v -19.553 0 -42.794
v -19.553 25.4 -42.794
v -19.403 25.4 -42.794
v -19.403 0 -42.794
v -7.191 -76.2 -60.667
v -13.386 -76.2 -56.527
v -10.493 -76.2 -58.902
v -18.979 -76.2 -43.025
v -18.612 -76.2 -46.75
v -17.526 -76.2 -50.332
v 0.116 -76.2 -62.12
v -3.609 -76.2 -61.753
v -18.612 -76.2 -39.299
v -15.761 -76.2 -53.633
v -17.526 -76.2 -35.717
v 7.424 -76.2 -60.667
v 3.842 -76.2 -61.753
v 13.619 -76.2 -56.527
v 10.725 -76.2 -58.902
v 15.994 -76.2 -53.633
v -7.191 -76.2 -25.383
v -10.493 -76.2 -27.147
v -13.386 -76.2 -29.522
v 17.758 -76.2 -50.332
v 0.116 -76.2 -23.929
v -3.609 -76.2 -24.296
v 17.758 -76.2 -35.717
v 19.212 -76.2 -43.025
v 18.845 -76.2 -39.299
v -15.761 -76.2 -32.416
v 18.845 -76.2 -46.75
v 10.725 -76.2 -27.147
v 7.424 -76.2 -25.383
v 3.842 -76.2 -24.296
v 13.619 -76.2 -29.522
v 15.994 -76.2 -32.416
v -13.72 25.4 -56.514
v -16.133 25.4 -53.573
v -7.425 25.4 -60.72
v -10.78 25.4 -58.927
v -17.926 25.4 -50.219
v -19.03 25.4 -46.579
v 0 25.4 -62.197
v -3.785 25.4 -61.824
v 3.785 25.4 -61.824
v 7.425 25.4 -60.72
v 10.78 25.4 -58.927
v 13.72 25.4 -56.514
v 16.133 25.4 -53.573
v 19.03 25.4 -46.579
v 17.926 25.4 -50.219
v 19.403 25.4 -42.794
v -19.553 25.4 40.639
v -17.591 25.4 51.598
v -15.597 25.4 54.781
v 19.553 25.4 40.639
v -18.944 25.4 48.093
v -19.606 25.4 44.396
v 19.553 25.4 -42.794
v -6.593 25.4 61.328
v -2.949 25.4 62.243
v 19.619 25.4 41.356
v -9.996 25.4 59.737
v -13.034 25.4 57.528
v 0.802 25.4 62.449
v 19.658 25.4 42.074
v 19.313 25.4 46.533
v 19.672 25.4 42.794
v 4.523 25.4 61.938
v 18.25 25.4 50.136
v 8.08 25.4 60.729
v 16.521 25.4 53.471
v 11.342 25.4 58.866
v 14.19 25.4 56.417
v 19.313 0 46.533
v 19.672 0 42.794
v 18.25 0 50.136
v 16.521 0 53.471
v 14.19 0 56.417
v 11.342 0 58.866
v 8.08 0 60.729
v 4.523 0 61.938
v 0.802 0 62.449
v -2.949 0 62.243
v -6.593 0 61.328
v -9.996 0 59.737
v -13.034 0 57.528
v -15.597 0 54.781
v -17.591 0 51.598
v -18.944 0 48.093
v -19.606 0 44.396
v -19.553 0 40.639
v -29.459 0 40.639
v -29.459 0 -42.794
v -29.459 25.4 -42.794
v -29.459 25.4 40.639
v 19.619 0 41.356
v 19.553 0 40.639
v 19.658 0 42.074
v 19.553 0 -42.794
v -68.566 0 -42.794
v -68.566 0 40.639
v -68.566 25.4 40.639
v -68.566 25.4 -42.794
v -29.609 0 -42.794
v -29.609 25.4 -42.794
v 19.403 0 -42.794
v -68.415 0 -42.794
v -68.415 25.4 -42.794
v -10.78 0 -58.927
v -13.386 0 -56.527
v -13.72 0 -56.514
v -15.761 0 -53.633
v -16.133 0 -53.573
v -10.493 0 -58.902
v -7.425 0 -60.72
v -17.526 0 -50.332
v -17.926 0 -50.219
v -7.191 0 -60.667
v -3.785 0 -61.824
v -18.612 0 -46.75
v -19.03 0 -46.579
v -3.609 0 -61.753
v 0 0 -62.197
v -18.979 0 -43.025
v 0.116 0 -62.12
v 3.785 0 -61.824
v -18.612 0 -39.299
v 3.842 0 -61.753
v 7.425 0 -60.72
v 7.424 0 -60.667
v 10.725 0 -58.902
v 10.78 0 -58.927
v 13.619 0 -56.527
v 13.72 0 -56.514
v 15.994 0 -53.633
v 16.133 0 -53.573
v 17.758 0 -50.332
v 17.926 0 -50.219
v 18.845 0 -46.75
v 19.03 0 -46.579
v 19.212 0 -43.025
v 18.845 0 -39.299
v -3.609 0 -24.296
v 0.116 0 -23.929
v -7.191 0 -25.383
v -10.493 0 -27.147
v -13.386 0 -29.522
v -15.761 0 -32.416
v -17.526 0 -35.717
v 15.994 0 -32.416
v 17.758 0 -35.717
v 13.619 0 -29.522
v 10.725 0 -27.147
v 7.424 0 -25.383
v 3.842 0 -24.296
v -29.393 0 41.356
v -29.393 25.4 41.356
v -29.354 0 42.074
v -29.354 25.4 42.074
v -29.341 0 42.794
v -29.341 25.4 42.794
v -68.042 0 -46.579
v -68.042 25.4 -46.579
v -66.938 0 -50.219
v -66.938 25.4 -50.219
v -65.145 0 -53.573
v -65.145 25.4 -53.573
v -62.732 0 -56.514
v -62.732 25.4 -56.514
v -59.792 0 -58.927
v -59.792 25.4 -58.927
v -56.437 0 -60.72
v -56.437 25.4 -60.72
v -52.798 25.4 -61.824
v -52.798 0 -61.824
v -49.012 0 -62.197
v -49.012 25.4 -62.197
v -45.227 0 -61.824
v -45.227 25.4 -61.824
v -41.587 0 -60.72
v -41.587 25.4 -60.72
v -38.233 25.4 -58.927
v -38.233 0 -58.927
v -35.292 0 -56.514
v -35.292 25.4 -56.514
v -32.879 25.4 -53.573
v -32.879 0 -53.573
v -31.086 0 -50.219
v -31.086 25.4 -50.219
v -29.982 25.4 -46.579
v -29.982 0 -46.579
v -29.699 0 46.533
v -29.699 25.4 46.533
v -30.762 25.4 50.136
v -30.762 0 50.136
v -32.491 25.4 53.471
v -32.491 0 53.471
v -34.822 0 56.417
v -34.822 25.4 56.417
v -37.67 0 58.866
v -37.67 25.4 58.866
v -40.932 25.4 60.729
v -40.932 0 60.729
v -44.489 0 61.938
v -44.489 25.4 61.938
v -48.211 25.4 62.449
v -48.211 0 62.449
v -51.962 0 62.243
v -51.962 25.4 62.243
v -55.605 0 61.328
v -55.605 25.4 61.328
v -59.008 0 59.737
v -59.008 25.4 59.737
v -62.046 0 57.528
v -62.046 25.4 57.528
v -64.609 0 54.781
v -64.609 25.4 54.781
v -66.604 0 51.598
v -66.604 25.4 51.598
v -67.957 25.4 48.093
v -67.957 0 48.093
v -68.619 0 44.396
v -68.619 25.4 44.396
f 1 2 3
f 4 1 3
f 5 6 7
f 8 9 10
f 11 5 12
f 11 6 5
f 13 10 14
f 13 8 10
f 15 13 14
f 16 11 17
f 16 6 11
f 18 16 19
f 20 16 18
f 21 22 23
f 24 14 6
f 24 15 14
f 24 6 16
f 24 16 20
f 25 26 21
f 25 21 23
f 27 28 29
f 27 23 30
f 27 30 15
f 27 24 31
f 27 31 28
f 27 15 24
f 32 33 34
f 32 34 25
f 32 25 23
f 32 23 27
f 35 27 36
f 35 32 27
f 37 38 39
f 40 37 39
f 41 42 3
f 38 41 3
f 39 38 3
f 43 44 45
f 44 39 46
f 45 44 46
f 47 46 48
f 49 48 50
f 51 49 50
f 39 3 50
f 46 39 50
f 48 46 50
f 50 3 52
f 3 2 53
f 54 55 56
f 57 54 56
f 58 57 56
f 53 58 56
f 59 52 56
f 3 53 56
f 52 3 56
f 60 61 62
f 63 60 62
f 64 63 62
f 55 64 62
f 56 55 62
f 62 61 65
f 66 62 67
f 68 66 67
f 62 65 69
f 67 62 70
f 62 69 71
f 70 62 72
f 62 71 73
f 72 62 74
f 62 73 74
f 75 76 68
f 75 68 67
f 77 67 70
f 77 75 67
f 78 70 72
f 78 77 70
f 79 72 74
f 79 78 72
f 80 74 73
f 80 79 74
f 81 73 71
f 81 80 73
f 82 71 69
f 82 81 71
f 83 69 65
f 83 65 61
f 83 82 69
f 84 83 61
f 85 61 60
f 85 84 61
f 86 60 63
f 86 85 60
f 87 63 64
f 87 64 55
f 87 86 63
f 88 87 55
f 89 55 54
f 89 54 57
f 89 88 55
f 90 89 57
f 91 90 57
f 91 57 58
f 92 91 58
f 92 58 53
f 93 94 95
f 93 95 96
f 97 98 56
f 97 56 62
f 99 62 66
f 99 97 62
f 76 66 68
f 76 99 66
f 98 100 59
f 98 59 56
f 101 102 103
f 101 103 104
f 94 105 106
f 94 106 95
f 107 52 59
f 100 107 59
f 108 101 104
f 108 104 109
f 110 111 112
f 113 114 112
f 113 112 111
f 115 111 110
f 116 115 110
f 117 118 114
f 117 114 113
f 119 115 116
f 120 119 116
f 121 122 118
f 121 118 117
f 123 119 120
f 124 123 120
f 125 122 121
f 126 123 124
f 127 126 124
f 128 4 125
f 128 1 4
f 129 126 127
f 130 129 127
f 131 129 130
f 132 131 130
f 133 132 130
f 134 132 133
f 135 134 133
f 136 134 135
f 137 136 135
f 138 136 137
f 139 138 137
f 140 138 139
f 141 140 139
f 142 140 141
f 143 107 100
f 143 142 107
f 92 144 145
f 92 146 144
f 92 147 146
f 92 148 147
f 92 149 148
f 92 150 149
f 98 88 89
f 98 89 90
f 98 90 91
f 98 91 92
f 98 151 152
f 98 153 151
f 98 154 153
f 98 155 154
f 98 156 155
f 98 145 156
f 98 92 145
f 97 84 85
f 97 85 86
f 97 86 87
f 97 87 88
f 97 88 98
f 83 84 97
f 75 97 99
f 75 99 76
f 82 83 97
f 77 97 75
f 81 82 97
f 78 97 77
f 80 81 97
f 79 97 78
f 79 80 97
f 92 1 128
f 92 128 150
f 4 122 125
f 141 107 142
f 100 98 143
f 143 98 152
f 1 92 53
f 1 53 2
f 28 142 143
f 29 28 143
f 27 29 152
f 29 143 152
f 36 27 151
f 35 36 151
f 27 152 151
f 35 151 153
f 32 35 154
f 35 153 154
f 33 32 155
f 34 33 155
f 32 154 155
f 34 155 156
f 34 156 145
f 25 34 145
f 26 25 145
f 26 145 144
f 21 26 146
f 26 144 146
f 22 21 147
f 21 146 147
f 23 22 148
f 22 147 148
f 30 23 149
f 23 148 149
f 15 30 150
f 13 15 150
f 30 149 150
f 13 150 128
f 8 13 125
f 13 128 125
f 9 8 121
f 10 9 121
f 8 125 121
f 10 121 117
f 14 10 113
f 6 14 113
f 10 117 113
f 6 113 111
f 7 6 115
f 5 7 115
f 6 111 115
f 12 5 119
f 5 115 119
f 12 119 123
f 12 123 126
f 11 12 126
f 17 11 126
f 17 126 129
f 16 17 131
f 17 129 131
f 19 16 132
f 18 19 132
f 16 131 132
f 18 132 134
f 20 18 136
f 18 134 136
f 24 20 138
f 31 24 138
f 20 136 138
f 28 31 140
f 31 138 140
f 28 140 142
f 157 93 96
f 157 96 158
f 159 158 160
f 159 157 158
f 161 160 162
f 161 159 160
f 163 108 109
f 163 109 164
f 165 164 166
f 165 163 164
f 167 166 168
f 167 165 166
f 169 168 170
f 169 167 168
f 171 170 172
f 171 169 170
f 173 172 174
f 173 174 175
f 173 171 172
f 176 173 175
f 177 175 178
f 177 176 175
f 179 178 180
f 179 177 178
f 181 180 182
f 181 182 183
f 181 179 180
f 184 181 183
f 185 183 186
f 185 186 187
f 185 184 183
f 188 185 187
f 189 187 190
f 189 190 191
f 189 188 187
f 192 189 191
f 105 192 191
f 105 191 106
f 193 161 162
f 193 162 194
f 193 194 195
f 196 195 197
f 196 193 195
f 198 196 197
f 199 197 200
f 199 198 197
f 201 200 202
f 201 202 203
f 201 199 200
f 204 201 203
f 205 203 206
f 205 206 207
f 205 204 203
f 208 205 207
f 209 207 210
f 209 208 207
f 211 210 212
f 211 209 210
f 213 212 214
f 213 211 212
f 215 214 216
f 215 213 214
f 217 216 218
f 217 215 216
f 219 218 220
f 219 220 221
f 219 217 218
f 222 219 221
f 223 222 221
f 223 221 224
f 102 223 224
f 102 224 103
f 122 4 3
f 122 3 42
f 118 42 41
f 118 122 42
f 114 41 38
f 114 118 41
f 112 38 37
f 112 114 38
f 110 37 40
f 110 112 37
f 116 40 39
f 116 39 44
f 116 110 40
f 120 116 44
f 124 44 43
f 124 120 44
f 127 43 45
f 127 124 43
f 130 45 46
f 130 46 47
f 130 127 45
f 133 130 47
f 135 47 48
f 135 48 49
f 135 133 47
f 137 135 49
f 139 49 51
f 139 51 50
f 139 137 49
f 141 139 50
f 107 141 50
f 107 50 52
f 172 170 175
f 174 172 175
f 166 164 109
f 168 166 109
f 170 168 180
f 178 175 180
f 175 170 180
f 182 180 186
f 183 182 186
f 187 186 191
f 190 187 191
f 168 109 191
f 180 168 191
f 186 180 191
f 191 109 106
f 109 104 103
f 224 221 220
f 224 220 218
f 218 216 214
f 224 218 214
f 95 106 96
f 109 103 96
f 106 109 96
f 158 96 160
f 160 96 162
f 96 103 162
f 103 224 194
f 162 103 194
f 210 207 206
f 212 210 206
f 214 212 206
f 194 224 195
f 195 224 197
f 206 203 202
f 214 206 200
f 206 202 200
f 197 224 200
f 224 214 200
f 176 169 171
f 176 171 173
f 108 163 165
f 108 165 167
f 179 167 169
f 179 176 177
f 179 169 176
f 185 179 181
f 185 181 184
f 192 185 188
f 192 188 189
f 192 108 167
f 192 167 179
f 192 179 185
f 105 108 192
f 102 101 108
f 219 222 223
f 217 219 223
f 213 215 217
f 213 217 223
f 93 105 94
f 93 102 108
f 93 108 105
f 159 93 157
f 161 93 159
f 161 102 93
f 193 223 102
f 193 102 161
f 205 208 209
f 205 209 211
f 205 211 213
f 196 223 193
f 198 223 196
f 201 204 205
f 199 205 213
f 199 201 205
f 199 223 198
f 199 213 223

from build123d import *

# Parameters (mm, degrees)
F1_DEPTH = 25.4
F2_R     = 19.0955706626
F3_DEPTH = 76.2
F5_DEPTH = 25.4


with BuildPart() as f1:
    # F0 (on Front) → F1 (new body)
    with BuildSketch(Plane.XZ):
        with BuildLine():
            Line((-19.5532236248, 40.6393535502), (-19.5532236248, 42.7938178182))
            Line((-19.5532236248, 42.7938178182), (19.5532236248, 42.7938178182))
            Line((19.5532236248, 42.7938178182), (19.5532236248, 40.6393535502))
            ThreePointArc((19.5532236248, 40.6393535502), (19.6419535806, 41.7149619699), (19.6715599383, 42.7938178182))
            ThreePointArc((19.6715599383, 42.7938178182), (-1.0788558483, 62.4357713988), (-19.5532236248, 40.6393535502))
        make_face()
        with BuildLine():
            Line((19.5532236248, 42.7938178182), (-19.5532236248, 42.7938178182))
            Line((-19.5532236248, 42.7938178182), (-19.5532236248, 40.6393535502))
            ThreePointArc((-19.5532236248, 40.6393535502), (0, 23.1222578799), (19.5532236248, 40.6393535502))
            Line((19.5532236248, 40.6393535502), (19.5532236248, 42.7938178182))
        make_face()
        with BuildLine():
            ThreePointArc((19.5532236248, 40.6393535502), (0, 23.1222578799), (-19.5532236248, 40.6393535502))
            Line((-19.5532236248, 40.6393535502), (-19.5532236248, -42.7938178182))
            Line((-19.5532236248, -42.7938178182), (-19.4028248978, -42.7938178182))
            ThreePointArc((-19.4028248978, -42.7938178182), (0, -23.3909929204), (19.4028248978, -42.7938178182))
            Line((19.4028248978, -42.7938178182), (19.5532236248, -42.7938178182))
            Line((19.5532236248, -42.7938178182), (19.5532236248, 40.6393535502))
        make_face()
        with BuildLine():
            ThreePointArc((19.4028248978, -42.7938178182), (0, -23.3909929204), (-19.4028248978, -42.7938178182))
            Line((-19.4028248978, -42.7938178182), (19.4028248978, -42.7938178182))
        make_face()
        with BuildLine():
            Line((19.4028248978, -42.7938178182), (-19.4028248978, -42.7938178182))
            ThreePointArc((-19.4028248978, -42.7938178182), (0, -62.196642716), (19.4028248978, -42.7938178182))
        make_face()
    extrude(amount=-F1_DEPTH)

    # F2 (on Front) → F3 (join)
    with BuildSketch(Plane.XZ):
        with Locations((0.1162295012, -43.0245069627)):
            Circle(F2_R)
    extrude(amount=F3_DEPTH)


with BuildPart() as f5:
    # F4 (on Front) → F5 (new body)
    with BuildSketch(Plane.XZ):
        with BuildLine():
            Line((-68.5655418783, 40.6393535502), (-68.5655418783, 42.7938178182))
            Line((-68.5655418783, 42.7938178182), (-29.4590946287, 42.7938178182))
            Line((-29.4590946287, 42.7938178182), (-29.4590946287, 40.6393535502))
            ThreePointArc((-29.4590946287, 40.6393535502), (-29.3703646729, 41.7149619699), (-29.3407583153, 42.7938178182))
            ThreePointArc((-29.3407583153, 42.7938178182), (-50.0911741018, 62.4357713988), (-68.5655418783, 40.6393535502))
        make_face()
        with BuildLine():
            Line((-29.4590946287, 42.7938178182), (-68.5655418783, 42.7938178182))
            Line((-68.5655418783, 42.7938178182), (-68.5655418783, 40.6393535502))
            ThreePointArc((-68.5655418783, 40.6393535502), (-49.0123182535, 23.1222578799), (-29.4590946287, 40.6393535502))
            Line((-29.4590946287, 40.6393535502), (-29.4590946287, 42.7938178182))
        make_face()
        with BuildLine():
            ThreePointArc((-29.4590946287, 40.6393535502), (-49.0123182535, 23.1222578799), (-68.5655418783, 40.6393535502))
            Line((-68.5655418783, 40.6393535502), (-68.5655418783, -42.7938178182))
            Line((-68.5655418783, -42.7938178182), (-68.4151431513, -42.7938178182))
            ThreePointArc((-68.4151431513, -42.7938178182), (-49.0123182535, -23.3909929204), (-29.6094933557, -42.7938178182))
            Line((-29.6094933557, -42.7938178182), (-29.4590946287, -42.7938178182))
            Line((-29.4590946287, -42.7938178182), (-29.4590946287, 40.6393535502))
        make_face()
        with BuildLine():
            ThreePointArc((-29.6094933557, -42.7938178182), (-49.0123182535, -23.3909929204), (-68.4151431513, -42.7938178182))
            Line((-68.4151431513, -42.7938178182), (-29.6094933557, -42.7938178182))
        make_face()
        with BuildLine():
            Line((-29.6094933557, -42.7938178182), (-68.4151431513, -42.7938178182))
            ThreePointArc((-68.4151431513, -42.7938178182), (-49.0123182535, -62.196642716), (-29.6094933557, -42.7938178182))
        make_face()
    extrude(amount=-F5_DEPTH)


solid = Compound([f1.part, f5.part])
